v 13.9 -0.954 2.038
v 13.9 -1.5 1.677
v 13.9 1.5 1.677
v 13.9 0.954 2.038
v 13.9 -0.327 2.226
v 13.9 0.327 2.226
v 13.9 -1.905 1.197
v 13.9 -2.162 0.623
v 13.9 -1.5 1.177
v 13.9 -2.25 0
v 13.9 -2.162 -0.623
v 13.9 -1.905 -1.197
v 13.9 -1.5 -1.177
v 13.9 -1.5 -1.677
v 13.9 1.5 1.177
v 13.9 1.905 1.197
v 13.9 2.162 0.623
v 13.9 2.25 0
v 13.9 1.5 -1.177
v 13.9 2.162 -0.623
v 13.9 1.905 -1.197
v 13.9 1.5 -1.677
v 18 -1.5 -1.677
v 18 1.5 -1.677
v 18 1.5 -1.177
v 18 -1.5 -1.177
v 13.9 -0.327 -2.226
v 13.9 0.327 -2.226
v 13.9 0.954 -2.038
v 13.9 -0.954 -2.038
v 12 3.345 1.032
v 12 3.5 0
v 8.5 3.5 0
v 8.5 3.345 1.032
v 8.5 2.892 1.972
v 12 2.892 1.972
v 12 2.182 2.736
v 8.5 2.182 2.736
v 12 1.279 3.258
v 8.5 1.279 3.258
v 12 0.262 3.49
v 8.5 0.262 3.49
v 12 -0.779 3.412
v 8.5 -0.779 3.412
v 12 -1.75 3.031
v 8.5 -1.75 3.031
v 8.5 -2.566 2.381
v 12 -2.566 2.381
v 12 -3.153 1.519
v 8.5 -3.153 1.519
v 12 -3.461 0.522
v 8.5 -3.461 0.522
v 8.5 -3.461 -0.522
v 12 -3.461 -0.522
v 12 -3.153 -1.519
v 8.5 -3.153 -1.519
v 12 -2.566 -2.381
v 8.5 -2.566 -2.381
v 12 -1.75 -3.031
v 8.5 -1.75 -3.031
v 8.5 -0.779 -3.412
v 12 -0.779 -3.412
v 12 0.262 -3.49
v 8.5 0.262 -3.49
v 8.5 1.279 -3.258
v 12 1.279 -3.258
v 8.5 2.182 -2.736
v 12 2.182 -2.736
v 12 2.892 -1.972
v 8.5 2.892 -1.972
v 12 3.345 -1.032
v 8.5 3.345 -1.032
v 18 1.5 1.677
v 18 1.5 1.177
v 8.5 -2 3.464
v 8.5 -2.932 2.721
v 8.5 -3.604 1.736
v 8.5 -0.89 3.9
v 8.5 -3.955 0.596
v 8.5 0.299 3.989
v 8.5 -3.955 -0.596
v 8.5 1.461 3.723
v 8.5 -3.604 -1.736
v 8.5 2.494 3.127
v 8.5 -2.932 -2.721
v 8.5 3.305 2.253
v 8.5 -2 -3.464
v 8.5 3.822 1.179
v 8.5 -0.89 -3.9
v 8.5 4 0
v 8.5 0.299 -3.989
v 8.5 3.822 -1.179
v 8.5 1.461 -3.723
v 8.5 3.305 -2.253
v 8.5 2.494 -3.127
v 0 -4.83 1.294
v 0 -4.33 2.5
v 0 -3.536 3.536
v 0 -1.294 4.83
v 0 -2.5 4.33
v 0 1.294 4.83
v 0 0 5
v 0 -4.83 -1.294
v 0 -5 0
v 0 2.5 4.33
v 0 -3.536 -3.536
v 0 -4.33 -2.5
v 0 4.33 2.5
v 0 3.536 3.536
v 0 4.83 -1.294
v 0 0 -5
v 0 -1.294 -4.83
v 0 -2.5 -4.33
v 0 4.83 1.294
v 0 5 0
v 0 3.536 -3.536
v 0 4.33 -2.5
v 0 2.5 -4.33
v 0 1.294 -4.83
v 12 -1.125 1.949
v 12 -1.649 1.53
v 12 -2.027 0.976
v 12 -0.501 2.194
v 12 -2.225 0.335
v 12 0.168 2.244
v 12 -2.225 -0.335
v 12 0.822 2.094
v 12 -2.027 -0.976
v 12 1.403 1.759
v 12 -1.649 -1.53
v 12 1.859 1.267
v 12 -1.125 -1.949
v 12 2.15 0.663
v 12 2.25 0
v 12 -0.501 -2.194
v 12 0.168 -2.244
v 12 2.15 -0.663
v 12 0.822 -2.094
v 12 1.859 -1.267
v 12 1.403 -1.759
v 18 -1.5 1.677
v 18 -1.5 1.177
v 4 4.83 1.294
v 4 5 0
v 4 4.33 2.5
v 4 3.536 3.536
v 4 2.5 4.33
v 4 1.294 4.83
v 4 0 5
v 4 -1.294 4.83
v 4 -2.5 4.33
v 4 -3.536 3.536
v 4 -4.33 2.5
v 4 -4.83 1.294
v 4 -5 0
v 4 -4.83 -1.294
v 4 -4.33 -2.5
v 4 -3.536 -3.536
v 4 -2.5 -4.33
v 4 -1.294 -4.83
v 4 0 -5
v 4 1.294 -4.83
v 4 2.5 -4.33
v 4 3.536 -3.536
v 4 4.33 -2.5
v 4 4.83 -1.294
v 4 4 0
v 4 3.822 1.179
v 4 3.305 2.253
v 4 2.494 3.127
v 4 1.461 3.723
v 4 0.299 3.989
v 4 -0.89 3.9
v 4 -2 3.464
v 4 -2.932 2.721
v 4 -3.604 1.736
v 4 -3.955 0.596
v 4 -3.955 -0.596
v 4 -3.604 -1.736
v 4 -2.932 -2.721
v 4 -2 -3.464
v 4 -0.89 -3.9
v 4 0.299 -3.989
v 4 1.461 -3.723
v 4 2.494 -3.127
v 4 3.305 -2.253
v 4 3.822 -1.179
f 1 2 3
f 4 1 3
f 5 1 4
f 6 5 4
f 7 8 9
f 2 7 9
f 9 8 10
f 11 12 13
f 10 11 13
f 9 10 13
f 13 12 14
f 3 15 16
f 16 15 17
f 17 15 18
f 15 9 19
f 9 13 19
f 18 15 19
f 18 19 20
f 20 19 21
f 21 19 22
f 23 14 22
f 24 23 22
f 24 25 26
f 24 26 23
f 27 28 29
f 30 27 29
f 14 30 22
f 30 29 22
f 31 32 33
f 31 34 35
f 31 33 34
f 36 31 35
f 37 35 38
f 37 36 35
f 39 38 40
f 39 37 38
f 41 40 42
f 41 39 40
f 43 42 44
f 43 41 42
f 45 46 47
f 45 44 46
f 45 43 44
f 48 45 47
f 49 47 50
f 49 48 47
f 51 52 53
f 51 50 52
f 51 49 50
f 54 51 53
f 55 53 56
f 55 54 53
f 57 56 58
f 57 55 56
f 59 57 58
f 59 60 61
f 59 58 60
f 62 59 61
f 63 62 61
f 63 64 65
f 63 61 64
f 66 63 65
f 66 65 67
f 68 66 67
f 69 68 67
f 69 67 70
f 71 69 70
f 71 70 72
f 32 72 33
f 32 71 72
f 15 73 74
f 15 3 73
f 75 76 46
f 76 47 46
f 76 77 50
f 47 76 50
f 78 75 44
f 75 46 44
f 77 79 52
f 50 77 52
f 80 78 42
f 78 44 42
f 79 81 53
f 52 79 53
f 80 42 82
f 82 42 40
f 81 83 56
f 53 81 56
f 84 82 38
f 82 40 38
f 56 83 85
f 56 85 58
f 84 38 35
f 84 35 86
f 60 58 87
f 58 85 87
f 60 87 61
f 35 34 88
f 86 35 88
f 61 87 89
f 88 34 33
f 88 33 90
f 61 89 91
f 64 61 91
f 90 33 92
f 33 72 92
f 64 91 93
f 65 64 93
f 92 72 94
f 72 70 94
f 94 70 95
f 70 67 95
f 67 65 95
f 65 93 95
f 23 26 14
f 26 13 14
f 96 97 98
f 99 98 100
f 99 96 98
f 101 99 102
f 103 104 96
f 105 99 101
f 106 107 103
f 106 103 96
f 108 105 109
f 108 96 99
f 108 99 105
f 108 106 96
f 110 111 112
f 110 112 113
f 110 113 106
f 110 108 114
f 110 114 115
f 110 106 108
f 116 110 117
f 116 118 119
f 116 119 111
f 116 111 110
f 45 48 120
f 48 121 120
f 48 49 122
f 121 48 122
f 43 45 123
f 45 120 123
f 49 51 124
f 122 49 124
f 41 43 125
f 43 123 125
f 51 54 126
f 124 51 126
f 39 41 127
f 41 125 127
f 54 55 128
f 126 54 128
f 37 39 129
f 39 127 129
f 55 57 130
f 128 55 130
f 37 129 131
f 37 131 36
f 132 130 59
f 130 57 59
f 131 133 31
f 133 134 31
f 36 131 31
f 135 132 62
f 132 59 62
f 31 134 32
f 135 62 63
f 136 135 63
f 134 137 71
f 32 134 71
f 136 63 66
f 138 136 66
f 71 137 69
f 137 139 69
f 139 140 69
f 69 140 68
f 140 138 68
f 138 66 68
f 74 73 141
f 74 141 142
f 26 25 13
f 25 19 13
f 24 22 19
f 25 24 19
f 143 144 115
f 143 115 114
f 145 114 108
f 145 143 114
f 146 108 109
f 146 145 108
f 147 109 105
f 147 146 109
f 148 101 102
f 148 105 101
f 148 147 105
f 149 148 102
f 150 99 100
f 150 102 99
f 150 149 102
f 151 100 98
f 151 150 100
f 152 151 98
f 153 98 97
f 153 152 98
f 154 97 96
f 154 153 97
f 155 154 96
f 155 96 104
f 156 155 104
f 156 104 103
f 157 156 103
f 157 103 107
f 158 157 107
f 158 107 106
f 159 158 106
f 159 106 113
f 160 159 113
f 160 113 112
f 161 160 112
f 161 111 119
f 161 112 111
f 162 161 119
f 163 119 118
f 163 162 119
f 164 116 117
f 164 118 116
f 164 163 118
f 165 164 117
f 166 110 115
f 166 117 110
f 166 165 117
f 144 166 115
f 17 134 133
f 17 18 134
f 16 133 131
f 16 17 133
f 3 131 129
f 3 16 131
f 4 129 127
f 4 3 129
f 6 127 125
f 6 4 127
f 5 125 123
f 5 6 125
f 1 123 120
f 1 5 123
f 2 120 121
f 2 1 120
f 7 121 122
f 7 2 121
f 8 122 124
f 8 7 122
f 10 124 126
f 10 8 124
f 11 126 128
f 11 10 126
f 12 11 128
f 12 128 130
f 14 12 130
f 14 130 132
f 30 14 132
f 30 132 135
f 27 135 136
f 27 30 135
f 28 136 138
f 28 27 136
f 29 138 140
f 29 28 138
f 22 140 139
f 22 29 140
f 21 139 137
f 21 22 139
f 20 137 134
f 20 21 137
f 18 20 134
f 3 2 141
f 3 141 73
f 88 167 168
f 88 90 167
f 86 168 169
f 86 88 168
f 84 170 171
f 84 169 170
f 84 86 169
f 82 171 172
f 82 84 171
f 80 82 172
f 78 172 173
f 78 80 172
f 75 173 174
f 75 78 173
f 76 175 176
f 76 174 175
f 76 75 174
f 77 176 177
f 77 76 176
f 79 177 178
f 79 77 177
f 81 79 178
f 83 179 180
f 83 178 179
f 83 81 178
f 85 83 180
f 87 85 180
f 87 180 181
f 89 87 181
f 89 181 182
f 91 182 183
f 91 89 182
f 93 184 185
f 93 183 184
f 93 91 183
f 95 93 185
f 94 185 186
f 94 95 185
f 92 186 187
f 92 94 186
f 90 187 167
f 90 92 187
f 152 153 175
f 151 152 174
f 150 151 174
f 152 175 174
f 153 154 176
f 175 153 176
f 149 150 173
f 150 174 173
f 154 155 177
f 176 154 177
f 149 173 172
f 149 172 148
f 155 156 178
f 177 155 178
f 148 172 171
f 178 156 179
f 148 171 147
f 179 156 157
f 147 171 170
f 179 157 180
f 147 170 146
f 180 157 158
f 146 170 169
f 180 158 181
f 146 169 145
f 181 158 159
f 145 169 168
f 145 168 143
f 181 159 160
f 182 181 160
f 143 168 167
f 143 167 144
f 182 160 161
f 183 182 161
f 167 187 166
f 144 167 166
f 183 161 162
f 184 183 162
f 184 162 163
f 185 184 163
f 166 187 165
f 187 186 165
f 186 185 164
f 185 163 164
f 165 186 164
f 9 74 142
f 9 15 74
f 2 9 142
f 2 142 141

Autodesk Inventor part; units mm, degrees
ref_plane "YZ Plane" through (0, 0, 0) normal (1, 0, 0) x (0, 1, 0)
ref_plane "XZ Plane" through (0, 0, 0) normal (0, 1, 0) x (-1, 0, 0)
ref_plane "XY Plane" through (0, 0, 0) normal (0, 0, 1) x (1, 0, 0)
sketch "スケッチ1" plane through (0, 0, 0) normal (0, 0, 1) x (1, 0, 0)
  line L0 (0, 0) -> (0, 5)
  line L1 (0, 5) -> (4, 5)
  line L2 (4, 5) -> (4, 4)
  line L3 (4, 4) -> (8.5, 4)
  line L4 (8.5, 4) -> (8.5, 3.5)
  line L5 (8.5, 3.5) -> (12, 3.5)
  line L6 (12, 3.5) -> (12, 2.25)
  line L7 (12, 2.25) -> (13.9, 2.25)
  line L8 (13.9, 2.25) -> (13.9, 0)
  line L9 (13.9, 0) -> (0, 0)
  dimension "d0" = 4
  dimension "d1" = 4.5
  dimension "d2" = 8
  dimension "d3" = 1.9
  dimension "d4" = 5
  dimension "d5" = 4
  dimension "d6" = 3.5
  dimension "d7" = 2.25
revolve "回転1" add sketch "スケッチ1" angle 360 about axis through (13.9, 0, 0) along (-1, 0, 0)
sketch "スケッチ2" plane through (13.9, 0, 0) normal (1, 0, 0) x (0, 0, -1)
  circle A0 centre (0, 0) radius 2.25 projected
  line L0 (-1.6771, 1.5) -> (-1.1771, 1.5)
  line L1 (-1.1771, 1.5) -> (-1.1771, -1.5)
  line L2 (-1.1771, -1.5) -> (-1.6771, -1.5)
  line L3 (-1.6771, -1.5) -> (-1.6771, 1.5)
  line L4 (1.6771, 1.5) -> (1.1771, 1.5)
  line L5 (1.1771, 1.5) -> (1.1771, -1.5)
  line L6 (1.1771, -1.5) -> (1.6771, -1.5)
  line L7 (1.6771, -1.5) -> (1.6771, 1.5)
  point P0 (-1.1771, 0)
  point P1 (1.1771, 0)
  dimension "d9" = 3
  dimension "d10" = 0.5
extrude "押し出し1" add sketch "スケッチ2" along normal blind 4.1 contours L7 L6 L5 L4 | L0 L1 L2 L3
properties part number "MJ-14"
